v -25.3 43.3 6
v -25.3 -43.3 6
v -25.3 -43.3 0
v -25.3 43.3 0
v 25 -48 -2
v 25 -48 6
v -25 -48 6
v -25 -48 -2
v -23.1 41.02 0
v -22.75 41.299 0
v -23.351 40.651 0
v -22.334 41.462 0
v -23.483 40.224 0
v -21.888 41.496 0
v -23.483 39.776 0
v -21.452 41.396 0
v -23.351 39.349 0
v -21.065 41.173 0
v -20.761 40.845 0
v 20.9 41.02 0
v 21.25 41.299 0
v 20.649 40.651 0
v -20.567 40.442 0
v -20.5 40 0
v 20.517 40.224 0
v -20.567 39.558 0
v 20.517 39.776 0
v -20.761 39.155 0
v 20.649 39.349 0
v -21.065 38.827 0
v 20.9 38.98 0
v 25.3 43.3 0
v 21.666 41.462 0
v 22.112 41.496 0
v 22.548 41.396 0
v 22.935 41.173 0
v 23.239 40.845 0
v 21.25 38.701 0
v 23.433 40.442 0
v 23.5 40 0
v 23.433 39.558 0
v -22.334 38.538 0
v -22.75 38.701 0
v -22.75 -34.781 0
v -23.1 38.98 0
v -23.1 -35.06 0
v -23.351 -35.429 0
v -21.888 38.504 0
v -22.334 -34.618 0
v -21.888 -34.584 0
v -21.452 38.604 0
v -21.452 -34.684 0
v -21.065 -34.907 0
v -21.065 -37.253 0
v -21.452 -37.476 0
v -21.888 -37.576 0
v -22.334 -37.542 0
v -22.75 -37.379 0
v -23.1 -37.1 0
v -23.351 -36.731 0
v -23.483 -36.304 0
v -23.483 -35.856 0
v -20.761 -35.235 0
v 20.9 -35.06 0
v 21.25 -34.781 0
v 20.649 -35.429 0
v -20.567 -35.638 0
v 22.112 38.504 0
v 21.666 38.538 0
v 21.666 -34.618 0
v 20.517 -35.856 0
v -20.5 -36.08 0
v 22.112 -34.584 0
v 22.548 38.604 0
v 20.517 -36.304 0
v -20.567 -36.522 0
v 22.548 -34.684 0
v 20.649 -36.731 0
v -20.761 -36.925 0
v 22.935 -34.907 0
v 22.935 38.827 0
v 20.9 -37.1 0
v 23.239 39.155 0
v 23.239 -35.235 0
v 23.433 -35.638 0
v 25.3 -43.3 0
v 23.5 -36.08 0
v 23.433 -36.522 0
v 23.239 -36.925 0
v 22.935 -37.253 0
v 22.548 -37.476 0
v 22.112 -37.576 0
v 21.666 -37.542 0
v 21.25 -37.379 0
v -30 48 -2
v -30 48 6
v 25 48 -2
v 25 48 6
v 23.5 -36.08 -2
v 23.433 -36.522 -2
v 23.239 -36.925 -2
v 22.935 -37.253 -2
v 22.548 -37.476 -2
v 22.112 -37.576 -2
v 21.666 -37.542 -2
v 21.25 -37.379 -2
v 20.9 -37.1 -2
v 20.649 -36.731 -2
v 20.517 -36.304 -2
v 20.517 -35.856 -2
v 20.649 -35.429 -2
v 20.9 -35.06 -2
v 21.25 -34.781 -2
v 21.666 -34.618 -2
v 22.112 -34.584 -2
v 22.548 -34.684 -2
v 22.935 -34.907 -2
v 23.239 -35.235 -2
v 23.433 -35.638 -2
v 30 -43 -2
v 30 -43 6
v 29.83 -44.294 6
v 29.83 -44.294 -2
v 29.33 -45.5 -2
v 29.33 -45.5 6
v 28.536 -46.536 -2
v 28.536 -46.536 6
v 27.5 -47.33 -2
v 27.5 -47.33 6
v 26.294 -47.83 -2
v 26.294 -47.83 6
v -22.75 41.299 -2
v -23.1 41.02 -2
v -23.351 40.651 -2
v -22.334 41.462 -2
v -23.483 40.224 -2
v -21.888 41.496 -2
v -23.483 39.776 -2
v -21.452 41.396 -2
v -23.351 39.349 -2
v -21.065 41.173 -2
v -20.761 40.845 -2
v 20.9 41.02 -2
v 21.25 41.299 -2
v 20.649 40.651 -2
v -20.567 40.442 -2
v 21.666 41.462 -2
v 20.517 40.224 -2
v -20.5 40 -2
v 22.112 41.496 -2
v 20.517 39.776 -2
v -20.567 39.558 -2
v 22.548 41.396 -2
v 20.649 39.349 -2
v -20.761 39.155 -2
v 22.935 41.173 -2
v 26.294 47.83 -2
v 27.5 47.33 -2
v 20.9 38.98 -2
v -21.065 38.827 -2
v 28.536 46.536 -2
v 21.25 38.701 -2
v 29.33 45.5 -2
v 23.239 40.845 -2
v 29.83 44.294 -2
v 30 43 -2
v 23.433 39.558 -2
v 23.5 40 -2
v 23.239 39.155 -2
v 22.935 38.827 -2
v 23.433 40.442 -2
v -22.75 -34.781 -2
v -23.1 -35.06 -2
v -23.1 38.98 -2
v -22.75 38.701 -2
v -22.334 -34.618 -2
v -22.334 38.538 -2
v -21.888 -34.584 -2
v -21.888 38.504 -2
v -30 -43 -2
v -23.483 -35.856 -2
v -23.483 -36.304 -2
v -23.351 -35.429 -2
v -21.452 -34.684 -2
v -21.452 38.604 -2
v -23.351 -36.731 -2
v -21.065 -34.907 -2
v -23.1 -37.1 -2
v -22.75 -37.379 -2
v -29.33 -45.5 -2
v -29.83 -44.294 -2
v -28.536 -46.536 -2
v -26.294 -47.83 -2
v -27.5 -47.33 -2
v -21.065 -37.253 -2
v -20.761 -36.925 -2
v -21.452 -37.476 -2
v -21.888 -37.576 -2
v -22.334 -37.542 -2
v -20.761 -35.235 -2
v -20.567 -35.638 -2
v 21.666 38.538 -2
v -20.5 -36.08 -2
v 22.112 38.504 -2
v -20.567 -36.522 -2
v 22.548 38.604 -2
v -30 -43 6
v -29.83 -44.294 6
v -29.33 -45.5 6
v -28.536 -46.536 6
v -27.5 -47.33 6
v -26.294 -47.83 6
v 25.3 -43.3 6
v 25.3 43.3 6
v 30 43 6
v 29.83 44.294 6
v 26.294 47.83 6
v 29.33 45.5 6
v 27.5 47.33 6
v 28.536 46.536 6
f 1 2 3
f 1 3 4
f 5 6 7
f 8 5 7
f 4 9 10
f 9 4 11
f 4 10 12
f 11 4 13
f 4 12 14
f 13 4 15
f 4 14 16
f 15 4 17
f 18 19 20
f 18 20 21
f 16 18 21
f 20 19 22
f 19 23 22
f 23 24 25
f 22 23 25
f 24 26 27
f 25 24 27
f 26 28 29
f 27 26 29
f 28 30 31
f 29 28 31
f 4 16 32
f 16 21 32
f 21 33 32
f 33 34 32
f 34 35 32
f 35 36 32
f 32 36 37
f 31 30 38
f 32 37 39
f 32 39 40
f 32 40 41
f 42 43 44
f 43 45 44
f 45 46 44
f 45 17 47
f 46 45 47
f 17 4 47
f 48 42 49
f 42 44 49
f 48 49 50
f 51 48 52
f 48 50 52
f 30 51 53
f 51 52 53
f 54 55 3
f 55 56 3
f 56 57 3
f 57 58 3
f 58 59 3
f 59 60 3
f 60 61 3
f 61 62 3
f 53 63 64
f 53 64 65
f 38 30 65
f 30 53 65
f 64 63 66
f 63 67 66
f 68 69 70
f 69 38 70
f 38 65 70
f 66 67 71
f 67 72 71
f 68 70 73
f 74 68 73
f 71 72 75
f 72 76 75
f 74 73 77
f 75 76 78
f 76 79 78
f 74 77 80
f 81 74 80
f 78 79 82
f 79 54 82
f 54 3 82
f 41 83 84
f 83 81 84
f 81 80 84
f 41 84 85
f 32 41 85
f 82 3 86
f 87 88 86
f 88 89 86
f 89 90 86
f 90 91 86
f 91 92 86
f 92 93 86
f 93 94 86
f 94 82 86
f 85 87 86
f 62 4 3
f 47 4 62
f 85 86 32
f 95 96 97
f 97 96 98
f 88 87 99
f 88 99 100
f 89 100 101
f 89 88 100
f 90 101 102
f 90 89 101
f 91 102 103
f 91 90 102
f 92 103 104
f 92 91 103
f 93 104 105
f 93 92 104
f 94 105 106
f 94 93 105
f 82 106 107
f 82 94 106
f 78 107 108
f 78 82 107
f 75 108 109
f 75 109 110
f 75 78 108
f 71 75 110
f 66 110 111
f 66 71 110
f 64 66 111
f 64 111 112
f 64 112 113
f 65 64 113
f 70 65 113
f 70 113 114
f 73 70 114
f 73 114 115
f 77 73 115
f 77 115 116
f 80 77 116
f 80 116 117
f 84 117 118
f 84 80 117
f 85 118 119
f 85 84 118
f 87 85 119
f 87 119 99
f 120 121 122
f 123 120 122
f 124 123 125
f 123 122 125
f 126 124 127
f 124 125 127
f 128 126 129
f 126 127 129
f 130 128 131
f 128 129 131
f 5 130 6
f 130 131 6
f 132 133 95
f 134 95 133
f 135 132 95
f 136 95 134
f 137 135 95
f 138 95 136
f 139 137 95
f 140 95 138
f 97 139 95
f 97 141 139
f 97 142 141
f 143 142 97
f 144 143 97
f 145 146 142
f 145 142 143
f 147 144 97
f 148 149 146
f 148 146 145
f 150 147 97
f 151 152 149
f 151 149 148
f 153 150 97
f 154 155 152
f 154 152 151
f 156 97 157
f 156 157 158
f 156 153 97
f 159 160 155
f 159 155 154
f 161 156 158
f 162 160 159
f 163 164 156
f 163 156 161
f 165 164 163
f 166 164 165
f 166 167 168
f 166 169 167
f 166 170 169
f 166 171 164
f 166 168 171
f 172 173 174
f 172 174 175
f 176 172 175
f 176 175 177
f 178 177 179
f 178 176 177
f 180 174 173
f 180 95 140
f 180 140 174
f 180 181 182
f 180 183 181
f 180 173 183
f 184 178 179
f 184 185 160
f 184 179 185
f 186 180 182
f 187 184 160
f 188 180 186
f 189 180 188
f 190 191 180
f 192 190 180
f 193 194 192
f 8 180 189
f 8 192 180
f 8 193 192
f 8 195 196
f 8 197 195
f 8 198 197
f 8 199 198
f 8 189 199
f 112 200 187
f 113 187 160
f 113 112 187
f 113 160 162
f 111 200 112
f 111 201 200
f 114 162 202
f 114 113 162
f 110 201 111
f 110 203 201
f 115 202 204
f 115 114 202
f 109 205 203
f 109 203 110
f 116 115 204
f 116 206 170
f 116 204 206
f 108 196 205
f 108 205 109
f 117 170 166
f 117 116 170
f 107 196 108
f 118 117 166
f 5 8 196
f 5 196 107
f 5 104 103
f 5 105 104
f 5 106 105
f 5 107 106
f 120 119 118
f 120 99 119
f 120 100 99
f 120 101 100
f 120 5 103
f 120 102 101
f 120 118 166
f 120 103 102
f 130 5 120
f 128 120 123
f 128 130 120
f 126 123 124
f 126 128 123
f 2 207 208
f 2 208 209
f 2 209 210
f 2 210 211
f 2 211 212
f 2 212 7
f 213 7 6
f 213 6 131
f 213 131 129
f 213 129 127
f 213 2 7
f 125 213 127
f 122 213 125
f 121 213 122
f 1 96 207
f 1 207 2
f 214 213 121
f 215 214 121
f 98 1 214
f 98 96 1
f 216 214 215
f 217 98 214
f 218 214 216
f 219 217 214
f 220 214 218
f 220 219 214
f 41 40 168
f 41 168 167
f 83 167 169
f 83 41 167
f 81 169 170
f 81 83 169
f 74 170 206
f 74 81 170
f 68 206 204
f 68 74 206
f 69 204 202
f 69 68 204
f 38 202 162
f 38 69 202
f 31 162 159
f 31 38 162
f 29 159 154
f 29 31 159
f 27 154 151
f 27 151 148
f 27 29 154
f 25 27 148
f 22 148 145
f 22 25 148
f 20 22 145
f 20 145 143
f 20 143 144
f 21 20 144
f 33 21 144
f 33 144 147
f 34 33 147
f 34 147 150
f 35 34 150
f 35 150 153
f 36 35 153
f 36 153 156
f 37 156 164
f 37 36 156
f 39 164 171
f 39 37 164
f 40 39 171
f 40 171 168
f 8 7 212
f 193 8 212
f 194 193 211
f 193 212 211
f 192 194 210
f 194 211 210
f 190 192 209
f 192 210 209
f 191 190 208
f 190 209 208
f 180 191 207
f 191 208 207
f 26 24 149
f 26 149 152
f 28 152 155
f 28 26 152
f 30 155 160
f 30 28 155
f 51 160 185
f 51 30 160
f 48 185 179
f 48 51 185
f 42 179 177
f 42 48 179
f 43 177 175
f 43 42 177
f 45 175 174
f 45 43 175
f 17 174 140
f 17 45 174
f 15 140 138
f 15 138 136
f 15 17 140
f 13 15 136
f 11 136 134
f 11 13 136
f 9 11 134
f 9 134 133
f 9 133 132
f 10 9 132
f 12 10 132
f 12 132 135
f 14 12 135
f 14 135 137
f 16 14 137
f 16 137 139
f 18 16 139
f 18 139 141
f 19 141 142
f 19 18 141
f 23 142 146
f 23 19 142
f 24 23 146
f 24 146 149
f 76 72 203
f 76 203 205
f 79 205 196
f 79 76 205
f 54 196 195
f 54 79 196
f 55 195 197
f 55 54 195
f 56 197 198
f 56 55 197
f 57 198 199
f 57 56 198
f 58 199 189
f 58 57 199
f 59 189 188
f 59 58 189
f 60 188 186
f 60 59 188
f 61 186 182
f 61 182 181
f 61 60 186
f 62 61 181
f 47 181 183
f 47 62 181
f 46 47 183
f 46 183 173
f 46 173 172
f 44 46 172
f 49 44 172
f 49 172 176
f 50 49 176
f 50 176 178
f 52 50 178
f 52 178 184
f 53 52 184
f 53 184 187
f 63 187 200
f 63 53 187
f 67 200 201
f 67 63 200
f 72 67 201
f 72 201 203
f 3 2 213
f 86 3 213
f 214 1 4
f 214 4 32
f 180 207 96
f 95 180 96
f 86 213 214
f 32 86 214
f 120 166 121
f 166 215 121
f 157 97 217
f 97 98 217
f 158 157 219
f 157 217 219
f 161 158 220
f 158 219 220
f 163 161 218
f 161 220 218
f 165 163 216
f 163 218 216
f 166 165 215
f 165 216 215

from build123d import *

# Parameters (mm, degrees)
F0_R     = 1.5
F1_DEPTH = 6
F2_W     = 50.6
F2_H     = 86.6
F2_R     = 1.5
F3_DEPTH = 6
F4_R     = 1.5
F5_DEPTH = 2


with BuildPart() as f1:
    # F0 (on Top) → F1 (new body)
    with BuildSketch(Plane.XY):
        with BuildLine():
            Line((-25, -48), (25, -48))
            ThreePointArc((25, -48), (28.535534, -46.535534), (30, -43))
            Line((30, -43), (30, 43))
            ThreePointArc((30, 43), (28.535534, 46.535534), (25, 48))
            Line((25, 48), (-27, 48))
            Line((-27, 48), (-30, 48))
            Line((-30, 48), (-30, 43))
            Line((-30, 43), (-30, -43))
            ThreePointArc((-30, -43), (-28.535534, -46.535534), (-25, -48))
        make_face()
        with Locations((-22, -36.08)):
            Circle(F0_R, mode=Mode.SUBTRACT)
        with Locations((22, -36.08)):
            Circle(F0_R, mode=Mode.SUBTRACT)
        with Locations((-22, 40)):
            Circle(F0_R, mode=Mode.SUBTRACT)
        with Locations((22, 40)):
            Circle(F0_R, mode=Mode.SUBTRACT)
    extrude(amount=F1_DEPTH)

    # F2 (on face) → F3 (cut)
    with BuildSketch(Plane.XY.offset(6)):
        Rectangle(F2_W, F2_H)
        with Locations((-22, -36.08)):
            Circle(F2_R, mode=Mode.SUBTRACT)
        with Locations((22, -36.08)):
            Circle(F2_R, mode=Mode.SUBTRACT)
        with Locations((-22, 40)):
            Circle(F2_R, mode=Mode.SUBTRACT)
        with Locations((22, 40)):
            Circle(F2_R, mode=Mode.SUBTRACT)
    extrude(amount=-F3_DEPTH, mode=Mode.SUBTRACT)

    # F4 (on face) → F5 (join)
    with BuildSketch(Plane(origin=(0, 0, 0), x_dir=(1, 0, 0), z_dir=(0, 0, -1))):
        with BuildLine():
            Line((-30, 43), (-30, -48))
            Line((-30, -48), (25, -48))
            ThreePointArc((25, -48), (28.535534, -46.535534), (30, -43))
            Line((30, -43), (30, 43))
            ThreePointArc((30, 43), (28.535534, 46.535534), (25, 48))
            Line((25, 48), (-25, 48))
            ThreePointArc((-25, 48), (-28.535534, 46.535534), (-30, 43))
        make_face()
        with Locations((-22, -40)):
            Circle(F4_R, mode=Mode.SUBTRACT)
        with Locations((22, -40)):
            Circle(F4_R, mode=Mode.SUBTRACT)
        with Locations((-22, 36.08)):
            Circle(F4_R, mode=Mode.SUBTRACT)
        with Locations((22, 36.08)):
            Circle(F4_R, mode=Mode.SUBTRACT)
    extrude(amount=F5_DEPTH)


solid = f1.part
